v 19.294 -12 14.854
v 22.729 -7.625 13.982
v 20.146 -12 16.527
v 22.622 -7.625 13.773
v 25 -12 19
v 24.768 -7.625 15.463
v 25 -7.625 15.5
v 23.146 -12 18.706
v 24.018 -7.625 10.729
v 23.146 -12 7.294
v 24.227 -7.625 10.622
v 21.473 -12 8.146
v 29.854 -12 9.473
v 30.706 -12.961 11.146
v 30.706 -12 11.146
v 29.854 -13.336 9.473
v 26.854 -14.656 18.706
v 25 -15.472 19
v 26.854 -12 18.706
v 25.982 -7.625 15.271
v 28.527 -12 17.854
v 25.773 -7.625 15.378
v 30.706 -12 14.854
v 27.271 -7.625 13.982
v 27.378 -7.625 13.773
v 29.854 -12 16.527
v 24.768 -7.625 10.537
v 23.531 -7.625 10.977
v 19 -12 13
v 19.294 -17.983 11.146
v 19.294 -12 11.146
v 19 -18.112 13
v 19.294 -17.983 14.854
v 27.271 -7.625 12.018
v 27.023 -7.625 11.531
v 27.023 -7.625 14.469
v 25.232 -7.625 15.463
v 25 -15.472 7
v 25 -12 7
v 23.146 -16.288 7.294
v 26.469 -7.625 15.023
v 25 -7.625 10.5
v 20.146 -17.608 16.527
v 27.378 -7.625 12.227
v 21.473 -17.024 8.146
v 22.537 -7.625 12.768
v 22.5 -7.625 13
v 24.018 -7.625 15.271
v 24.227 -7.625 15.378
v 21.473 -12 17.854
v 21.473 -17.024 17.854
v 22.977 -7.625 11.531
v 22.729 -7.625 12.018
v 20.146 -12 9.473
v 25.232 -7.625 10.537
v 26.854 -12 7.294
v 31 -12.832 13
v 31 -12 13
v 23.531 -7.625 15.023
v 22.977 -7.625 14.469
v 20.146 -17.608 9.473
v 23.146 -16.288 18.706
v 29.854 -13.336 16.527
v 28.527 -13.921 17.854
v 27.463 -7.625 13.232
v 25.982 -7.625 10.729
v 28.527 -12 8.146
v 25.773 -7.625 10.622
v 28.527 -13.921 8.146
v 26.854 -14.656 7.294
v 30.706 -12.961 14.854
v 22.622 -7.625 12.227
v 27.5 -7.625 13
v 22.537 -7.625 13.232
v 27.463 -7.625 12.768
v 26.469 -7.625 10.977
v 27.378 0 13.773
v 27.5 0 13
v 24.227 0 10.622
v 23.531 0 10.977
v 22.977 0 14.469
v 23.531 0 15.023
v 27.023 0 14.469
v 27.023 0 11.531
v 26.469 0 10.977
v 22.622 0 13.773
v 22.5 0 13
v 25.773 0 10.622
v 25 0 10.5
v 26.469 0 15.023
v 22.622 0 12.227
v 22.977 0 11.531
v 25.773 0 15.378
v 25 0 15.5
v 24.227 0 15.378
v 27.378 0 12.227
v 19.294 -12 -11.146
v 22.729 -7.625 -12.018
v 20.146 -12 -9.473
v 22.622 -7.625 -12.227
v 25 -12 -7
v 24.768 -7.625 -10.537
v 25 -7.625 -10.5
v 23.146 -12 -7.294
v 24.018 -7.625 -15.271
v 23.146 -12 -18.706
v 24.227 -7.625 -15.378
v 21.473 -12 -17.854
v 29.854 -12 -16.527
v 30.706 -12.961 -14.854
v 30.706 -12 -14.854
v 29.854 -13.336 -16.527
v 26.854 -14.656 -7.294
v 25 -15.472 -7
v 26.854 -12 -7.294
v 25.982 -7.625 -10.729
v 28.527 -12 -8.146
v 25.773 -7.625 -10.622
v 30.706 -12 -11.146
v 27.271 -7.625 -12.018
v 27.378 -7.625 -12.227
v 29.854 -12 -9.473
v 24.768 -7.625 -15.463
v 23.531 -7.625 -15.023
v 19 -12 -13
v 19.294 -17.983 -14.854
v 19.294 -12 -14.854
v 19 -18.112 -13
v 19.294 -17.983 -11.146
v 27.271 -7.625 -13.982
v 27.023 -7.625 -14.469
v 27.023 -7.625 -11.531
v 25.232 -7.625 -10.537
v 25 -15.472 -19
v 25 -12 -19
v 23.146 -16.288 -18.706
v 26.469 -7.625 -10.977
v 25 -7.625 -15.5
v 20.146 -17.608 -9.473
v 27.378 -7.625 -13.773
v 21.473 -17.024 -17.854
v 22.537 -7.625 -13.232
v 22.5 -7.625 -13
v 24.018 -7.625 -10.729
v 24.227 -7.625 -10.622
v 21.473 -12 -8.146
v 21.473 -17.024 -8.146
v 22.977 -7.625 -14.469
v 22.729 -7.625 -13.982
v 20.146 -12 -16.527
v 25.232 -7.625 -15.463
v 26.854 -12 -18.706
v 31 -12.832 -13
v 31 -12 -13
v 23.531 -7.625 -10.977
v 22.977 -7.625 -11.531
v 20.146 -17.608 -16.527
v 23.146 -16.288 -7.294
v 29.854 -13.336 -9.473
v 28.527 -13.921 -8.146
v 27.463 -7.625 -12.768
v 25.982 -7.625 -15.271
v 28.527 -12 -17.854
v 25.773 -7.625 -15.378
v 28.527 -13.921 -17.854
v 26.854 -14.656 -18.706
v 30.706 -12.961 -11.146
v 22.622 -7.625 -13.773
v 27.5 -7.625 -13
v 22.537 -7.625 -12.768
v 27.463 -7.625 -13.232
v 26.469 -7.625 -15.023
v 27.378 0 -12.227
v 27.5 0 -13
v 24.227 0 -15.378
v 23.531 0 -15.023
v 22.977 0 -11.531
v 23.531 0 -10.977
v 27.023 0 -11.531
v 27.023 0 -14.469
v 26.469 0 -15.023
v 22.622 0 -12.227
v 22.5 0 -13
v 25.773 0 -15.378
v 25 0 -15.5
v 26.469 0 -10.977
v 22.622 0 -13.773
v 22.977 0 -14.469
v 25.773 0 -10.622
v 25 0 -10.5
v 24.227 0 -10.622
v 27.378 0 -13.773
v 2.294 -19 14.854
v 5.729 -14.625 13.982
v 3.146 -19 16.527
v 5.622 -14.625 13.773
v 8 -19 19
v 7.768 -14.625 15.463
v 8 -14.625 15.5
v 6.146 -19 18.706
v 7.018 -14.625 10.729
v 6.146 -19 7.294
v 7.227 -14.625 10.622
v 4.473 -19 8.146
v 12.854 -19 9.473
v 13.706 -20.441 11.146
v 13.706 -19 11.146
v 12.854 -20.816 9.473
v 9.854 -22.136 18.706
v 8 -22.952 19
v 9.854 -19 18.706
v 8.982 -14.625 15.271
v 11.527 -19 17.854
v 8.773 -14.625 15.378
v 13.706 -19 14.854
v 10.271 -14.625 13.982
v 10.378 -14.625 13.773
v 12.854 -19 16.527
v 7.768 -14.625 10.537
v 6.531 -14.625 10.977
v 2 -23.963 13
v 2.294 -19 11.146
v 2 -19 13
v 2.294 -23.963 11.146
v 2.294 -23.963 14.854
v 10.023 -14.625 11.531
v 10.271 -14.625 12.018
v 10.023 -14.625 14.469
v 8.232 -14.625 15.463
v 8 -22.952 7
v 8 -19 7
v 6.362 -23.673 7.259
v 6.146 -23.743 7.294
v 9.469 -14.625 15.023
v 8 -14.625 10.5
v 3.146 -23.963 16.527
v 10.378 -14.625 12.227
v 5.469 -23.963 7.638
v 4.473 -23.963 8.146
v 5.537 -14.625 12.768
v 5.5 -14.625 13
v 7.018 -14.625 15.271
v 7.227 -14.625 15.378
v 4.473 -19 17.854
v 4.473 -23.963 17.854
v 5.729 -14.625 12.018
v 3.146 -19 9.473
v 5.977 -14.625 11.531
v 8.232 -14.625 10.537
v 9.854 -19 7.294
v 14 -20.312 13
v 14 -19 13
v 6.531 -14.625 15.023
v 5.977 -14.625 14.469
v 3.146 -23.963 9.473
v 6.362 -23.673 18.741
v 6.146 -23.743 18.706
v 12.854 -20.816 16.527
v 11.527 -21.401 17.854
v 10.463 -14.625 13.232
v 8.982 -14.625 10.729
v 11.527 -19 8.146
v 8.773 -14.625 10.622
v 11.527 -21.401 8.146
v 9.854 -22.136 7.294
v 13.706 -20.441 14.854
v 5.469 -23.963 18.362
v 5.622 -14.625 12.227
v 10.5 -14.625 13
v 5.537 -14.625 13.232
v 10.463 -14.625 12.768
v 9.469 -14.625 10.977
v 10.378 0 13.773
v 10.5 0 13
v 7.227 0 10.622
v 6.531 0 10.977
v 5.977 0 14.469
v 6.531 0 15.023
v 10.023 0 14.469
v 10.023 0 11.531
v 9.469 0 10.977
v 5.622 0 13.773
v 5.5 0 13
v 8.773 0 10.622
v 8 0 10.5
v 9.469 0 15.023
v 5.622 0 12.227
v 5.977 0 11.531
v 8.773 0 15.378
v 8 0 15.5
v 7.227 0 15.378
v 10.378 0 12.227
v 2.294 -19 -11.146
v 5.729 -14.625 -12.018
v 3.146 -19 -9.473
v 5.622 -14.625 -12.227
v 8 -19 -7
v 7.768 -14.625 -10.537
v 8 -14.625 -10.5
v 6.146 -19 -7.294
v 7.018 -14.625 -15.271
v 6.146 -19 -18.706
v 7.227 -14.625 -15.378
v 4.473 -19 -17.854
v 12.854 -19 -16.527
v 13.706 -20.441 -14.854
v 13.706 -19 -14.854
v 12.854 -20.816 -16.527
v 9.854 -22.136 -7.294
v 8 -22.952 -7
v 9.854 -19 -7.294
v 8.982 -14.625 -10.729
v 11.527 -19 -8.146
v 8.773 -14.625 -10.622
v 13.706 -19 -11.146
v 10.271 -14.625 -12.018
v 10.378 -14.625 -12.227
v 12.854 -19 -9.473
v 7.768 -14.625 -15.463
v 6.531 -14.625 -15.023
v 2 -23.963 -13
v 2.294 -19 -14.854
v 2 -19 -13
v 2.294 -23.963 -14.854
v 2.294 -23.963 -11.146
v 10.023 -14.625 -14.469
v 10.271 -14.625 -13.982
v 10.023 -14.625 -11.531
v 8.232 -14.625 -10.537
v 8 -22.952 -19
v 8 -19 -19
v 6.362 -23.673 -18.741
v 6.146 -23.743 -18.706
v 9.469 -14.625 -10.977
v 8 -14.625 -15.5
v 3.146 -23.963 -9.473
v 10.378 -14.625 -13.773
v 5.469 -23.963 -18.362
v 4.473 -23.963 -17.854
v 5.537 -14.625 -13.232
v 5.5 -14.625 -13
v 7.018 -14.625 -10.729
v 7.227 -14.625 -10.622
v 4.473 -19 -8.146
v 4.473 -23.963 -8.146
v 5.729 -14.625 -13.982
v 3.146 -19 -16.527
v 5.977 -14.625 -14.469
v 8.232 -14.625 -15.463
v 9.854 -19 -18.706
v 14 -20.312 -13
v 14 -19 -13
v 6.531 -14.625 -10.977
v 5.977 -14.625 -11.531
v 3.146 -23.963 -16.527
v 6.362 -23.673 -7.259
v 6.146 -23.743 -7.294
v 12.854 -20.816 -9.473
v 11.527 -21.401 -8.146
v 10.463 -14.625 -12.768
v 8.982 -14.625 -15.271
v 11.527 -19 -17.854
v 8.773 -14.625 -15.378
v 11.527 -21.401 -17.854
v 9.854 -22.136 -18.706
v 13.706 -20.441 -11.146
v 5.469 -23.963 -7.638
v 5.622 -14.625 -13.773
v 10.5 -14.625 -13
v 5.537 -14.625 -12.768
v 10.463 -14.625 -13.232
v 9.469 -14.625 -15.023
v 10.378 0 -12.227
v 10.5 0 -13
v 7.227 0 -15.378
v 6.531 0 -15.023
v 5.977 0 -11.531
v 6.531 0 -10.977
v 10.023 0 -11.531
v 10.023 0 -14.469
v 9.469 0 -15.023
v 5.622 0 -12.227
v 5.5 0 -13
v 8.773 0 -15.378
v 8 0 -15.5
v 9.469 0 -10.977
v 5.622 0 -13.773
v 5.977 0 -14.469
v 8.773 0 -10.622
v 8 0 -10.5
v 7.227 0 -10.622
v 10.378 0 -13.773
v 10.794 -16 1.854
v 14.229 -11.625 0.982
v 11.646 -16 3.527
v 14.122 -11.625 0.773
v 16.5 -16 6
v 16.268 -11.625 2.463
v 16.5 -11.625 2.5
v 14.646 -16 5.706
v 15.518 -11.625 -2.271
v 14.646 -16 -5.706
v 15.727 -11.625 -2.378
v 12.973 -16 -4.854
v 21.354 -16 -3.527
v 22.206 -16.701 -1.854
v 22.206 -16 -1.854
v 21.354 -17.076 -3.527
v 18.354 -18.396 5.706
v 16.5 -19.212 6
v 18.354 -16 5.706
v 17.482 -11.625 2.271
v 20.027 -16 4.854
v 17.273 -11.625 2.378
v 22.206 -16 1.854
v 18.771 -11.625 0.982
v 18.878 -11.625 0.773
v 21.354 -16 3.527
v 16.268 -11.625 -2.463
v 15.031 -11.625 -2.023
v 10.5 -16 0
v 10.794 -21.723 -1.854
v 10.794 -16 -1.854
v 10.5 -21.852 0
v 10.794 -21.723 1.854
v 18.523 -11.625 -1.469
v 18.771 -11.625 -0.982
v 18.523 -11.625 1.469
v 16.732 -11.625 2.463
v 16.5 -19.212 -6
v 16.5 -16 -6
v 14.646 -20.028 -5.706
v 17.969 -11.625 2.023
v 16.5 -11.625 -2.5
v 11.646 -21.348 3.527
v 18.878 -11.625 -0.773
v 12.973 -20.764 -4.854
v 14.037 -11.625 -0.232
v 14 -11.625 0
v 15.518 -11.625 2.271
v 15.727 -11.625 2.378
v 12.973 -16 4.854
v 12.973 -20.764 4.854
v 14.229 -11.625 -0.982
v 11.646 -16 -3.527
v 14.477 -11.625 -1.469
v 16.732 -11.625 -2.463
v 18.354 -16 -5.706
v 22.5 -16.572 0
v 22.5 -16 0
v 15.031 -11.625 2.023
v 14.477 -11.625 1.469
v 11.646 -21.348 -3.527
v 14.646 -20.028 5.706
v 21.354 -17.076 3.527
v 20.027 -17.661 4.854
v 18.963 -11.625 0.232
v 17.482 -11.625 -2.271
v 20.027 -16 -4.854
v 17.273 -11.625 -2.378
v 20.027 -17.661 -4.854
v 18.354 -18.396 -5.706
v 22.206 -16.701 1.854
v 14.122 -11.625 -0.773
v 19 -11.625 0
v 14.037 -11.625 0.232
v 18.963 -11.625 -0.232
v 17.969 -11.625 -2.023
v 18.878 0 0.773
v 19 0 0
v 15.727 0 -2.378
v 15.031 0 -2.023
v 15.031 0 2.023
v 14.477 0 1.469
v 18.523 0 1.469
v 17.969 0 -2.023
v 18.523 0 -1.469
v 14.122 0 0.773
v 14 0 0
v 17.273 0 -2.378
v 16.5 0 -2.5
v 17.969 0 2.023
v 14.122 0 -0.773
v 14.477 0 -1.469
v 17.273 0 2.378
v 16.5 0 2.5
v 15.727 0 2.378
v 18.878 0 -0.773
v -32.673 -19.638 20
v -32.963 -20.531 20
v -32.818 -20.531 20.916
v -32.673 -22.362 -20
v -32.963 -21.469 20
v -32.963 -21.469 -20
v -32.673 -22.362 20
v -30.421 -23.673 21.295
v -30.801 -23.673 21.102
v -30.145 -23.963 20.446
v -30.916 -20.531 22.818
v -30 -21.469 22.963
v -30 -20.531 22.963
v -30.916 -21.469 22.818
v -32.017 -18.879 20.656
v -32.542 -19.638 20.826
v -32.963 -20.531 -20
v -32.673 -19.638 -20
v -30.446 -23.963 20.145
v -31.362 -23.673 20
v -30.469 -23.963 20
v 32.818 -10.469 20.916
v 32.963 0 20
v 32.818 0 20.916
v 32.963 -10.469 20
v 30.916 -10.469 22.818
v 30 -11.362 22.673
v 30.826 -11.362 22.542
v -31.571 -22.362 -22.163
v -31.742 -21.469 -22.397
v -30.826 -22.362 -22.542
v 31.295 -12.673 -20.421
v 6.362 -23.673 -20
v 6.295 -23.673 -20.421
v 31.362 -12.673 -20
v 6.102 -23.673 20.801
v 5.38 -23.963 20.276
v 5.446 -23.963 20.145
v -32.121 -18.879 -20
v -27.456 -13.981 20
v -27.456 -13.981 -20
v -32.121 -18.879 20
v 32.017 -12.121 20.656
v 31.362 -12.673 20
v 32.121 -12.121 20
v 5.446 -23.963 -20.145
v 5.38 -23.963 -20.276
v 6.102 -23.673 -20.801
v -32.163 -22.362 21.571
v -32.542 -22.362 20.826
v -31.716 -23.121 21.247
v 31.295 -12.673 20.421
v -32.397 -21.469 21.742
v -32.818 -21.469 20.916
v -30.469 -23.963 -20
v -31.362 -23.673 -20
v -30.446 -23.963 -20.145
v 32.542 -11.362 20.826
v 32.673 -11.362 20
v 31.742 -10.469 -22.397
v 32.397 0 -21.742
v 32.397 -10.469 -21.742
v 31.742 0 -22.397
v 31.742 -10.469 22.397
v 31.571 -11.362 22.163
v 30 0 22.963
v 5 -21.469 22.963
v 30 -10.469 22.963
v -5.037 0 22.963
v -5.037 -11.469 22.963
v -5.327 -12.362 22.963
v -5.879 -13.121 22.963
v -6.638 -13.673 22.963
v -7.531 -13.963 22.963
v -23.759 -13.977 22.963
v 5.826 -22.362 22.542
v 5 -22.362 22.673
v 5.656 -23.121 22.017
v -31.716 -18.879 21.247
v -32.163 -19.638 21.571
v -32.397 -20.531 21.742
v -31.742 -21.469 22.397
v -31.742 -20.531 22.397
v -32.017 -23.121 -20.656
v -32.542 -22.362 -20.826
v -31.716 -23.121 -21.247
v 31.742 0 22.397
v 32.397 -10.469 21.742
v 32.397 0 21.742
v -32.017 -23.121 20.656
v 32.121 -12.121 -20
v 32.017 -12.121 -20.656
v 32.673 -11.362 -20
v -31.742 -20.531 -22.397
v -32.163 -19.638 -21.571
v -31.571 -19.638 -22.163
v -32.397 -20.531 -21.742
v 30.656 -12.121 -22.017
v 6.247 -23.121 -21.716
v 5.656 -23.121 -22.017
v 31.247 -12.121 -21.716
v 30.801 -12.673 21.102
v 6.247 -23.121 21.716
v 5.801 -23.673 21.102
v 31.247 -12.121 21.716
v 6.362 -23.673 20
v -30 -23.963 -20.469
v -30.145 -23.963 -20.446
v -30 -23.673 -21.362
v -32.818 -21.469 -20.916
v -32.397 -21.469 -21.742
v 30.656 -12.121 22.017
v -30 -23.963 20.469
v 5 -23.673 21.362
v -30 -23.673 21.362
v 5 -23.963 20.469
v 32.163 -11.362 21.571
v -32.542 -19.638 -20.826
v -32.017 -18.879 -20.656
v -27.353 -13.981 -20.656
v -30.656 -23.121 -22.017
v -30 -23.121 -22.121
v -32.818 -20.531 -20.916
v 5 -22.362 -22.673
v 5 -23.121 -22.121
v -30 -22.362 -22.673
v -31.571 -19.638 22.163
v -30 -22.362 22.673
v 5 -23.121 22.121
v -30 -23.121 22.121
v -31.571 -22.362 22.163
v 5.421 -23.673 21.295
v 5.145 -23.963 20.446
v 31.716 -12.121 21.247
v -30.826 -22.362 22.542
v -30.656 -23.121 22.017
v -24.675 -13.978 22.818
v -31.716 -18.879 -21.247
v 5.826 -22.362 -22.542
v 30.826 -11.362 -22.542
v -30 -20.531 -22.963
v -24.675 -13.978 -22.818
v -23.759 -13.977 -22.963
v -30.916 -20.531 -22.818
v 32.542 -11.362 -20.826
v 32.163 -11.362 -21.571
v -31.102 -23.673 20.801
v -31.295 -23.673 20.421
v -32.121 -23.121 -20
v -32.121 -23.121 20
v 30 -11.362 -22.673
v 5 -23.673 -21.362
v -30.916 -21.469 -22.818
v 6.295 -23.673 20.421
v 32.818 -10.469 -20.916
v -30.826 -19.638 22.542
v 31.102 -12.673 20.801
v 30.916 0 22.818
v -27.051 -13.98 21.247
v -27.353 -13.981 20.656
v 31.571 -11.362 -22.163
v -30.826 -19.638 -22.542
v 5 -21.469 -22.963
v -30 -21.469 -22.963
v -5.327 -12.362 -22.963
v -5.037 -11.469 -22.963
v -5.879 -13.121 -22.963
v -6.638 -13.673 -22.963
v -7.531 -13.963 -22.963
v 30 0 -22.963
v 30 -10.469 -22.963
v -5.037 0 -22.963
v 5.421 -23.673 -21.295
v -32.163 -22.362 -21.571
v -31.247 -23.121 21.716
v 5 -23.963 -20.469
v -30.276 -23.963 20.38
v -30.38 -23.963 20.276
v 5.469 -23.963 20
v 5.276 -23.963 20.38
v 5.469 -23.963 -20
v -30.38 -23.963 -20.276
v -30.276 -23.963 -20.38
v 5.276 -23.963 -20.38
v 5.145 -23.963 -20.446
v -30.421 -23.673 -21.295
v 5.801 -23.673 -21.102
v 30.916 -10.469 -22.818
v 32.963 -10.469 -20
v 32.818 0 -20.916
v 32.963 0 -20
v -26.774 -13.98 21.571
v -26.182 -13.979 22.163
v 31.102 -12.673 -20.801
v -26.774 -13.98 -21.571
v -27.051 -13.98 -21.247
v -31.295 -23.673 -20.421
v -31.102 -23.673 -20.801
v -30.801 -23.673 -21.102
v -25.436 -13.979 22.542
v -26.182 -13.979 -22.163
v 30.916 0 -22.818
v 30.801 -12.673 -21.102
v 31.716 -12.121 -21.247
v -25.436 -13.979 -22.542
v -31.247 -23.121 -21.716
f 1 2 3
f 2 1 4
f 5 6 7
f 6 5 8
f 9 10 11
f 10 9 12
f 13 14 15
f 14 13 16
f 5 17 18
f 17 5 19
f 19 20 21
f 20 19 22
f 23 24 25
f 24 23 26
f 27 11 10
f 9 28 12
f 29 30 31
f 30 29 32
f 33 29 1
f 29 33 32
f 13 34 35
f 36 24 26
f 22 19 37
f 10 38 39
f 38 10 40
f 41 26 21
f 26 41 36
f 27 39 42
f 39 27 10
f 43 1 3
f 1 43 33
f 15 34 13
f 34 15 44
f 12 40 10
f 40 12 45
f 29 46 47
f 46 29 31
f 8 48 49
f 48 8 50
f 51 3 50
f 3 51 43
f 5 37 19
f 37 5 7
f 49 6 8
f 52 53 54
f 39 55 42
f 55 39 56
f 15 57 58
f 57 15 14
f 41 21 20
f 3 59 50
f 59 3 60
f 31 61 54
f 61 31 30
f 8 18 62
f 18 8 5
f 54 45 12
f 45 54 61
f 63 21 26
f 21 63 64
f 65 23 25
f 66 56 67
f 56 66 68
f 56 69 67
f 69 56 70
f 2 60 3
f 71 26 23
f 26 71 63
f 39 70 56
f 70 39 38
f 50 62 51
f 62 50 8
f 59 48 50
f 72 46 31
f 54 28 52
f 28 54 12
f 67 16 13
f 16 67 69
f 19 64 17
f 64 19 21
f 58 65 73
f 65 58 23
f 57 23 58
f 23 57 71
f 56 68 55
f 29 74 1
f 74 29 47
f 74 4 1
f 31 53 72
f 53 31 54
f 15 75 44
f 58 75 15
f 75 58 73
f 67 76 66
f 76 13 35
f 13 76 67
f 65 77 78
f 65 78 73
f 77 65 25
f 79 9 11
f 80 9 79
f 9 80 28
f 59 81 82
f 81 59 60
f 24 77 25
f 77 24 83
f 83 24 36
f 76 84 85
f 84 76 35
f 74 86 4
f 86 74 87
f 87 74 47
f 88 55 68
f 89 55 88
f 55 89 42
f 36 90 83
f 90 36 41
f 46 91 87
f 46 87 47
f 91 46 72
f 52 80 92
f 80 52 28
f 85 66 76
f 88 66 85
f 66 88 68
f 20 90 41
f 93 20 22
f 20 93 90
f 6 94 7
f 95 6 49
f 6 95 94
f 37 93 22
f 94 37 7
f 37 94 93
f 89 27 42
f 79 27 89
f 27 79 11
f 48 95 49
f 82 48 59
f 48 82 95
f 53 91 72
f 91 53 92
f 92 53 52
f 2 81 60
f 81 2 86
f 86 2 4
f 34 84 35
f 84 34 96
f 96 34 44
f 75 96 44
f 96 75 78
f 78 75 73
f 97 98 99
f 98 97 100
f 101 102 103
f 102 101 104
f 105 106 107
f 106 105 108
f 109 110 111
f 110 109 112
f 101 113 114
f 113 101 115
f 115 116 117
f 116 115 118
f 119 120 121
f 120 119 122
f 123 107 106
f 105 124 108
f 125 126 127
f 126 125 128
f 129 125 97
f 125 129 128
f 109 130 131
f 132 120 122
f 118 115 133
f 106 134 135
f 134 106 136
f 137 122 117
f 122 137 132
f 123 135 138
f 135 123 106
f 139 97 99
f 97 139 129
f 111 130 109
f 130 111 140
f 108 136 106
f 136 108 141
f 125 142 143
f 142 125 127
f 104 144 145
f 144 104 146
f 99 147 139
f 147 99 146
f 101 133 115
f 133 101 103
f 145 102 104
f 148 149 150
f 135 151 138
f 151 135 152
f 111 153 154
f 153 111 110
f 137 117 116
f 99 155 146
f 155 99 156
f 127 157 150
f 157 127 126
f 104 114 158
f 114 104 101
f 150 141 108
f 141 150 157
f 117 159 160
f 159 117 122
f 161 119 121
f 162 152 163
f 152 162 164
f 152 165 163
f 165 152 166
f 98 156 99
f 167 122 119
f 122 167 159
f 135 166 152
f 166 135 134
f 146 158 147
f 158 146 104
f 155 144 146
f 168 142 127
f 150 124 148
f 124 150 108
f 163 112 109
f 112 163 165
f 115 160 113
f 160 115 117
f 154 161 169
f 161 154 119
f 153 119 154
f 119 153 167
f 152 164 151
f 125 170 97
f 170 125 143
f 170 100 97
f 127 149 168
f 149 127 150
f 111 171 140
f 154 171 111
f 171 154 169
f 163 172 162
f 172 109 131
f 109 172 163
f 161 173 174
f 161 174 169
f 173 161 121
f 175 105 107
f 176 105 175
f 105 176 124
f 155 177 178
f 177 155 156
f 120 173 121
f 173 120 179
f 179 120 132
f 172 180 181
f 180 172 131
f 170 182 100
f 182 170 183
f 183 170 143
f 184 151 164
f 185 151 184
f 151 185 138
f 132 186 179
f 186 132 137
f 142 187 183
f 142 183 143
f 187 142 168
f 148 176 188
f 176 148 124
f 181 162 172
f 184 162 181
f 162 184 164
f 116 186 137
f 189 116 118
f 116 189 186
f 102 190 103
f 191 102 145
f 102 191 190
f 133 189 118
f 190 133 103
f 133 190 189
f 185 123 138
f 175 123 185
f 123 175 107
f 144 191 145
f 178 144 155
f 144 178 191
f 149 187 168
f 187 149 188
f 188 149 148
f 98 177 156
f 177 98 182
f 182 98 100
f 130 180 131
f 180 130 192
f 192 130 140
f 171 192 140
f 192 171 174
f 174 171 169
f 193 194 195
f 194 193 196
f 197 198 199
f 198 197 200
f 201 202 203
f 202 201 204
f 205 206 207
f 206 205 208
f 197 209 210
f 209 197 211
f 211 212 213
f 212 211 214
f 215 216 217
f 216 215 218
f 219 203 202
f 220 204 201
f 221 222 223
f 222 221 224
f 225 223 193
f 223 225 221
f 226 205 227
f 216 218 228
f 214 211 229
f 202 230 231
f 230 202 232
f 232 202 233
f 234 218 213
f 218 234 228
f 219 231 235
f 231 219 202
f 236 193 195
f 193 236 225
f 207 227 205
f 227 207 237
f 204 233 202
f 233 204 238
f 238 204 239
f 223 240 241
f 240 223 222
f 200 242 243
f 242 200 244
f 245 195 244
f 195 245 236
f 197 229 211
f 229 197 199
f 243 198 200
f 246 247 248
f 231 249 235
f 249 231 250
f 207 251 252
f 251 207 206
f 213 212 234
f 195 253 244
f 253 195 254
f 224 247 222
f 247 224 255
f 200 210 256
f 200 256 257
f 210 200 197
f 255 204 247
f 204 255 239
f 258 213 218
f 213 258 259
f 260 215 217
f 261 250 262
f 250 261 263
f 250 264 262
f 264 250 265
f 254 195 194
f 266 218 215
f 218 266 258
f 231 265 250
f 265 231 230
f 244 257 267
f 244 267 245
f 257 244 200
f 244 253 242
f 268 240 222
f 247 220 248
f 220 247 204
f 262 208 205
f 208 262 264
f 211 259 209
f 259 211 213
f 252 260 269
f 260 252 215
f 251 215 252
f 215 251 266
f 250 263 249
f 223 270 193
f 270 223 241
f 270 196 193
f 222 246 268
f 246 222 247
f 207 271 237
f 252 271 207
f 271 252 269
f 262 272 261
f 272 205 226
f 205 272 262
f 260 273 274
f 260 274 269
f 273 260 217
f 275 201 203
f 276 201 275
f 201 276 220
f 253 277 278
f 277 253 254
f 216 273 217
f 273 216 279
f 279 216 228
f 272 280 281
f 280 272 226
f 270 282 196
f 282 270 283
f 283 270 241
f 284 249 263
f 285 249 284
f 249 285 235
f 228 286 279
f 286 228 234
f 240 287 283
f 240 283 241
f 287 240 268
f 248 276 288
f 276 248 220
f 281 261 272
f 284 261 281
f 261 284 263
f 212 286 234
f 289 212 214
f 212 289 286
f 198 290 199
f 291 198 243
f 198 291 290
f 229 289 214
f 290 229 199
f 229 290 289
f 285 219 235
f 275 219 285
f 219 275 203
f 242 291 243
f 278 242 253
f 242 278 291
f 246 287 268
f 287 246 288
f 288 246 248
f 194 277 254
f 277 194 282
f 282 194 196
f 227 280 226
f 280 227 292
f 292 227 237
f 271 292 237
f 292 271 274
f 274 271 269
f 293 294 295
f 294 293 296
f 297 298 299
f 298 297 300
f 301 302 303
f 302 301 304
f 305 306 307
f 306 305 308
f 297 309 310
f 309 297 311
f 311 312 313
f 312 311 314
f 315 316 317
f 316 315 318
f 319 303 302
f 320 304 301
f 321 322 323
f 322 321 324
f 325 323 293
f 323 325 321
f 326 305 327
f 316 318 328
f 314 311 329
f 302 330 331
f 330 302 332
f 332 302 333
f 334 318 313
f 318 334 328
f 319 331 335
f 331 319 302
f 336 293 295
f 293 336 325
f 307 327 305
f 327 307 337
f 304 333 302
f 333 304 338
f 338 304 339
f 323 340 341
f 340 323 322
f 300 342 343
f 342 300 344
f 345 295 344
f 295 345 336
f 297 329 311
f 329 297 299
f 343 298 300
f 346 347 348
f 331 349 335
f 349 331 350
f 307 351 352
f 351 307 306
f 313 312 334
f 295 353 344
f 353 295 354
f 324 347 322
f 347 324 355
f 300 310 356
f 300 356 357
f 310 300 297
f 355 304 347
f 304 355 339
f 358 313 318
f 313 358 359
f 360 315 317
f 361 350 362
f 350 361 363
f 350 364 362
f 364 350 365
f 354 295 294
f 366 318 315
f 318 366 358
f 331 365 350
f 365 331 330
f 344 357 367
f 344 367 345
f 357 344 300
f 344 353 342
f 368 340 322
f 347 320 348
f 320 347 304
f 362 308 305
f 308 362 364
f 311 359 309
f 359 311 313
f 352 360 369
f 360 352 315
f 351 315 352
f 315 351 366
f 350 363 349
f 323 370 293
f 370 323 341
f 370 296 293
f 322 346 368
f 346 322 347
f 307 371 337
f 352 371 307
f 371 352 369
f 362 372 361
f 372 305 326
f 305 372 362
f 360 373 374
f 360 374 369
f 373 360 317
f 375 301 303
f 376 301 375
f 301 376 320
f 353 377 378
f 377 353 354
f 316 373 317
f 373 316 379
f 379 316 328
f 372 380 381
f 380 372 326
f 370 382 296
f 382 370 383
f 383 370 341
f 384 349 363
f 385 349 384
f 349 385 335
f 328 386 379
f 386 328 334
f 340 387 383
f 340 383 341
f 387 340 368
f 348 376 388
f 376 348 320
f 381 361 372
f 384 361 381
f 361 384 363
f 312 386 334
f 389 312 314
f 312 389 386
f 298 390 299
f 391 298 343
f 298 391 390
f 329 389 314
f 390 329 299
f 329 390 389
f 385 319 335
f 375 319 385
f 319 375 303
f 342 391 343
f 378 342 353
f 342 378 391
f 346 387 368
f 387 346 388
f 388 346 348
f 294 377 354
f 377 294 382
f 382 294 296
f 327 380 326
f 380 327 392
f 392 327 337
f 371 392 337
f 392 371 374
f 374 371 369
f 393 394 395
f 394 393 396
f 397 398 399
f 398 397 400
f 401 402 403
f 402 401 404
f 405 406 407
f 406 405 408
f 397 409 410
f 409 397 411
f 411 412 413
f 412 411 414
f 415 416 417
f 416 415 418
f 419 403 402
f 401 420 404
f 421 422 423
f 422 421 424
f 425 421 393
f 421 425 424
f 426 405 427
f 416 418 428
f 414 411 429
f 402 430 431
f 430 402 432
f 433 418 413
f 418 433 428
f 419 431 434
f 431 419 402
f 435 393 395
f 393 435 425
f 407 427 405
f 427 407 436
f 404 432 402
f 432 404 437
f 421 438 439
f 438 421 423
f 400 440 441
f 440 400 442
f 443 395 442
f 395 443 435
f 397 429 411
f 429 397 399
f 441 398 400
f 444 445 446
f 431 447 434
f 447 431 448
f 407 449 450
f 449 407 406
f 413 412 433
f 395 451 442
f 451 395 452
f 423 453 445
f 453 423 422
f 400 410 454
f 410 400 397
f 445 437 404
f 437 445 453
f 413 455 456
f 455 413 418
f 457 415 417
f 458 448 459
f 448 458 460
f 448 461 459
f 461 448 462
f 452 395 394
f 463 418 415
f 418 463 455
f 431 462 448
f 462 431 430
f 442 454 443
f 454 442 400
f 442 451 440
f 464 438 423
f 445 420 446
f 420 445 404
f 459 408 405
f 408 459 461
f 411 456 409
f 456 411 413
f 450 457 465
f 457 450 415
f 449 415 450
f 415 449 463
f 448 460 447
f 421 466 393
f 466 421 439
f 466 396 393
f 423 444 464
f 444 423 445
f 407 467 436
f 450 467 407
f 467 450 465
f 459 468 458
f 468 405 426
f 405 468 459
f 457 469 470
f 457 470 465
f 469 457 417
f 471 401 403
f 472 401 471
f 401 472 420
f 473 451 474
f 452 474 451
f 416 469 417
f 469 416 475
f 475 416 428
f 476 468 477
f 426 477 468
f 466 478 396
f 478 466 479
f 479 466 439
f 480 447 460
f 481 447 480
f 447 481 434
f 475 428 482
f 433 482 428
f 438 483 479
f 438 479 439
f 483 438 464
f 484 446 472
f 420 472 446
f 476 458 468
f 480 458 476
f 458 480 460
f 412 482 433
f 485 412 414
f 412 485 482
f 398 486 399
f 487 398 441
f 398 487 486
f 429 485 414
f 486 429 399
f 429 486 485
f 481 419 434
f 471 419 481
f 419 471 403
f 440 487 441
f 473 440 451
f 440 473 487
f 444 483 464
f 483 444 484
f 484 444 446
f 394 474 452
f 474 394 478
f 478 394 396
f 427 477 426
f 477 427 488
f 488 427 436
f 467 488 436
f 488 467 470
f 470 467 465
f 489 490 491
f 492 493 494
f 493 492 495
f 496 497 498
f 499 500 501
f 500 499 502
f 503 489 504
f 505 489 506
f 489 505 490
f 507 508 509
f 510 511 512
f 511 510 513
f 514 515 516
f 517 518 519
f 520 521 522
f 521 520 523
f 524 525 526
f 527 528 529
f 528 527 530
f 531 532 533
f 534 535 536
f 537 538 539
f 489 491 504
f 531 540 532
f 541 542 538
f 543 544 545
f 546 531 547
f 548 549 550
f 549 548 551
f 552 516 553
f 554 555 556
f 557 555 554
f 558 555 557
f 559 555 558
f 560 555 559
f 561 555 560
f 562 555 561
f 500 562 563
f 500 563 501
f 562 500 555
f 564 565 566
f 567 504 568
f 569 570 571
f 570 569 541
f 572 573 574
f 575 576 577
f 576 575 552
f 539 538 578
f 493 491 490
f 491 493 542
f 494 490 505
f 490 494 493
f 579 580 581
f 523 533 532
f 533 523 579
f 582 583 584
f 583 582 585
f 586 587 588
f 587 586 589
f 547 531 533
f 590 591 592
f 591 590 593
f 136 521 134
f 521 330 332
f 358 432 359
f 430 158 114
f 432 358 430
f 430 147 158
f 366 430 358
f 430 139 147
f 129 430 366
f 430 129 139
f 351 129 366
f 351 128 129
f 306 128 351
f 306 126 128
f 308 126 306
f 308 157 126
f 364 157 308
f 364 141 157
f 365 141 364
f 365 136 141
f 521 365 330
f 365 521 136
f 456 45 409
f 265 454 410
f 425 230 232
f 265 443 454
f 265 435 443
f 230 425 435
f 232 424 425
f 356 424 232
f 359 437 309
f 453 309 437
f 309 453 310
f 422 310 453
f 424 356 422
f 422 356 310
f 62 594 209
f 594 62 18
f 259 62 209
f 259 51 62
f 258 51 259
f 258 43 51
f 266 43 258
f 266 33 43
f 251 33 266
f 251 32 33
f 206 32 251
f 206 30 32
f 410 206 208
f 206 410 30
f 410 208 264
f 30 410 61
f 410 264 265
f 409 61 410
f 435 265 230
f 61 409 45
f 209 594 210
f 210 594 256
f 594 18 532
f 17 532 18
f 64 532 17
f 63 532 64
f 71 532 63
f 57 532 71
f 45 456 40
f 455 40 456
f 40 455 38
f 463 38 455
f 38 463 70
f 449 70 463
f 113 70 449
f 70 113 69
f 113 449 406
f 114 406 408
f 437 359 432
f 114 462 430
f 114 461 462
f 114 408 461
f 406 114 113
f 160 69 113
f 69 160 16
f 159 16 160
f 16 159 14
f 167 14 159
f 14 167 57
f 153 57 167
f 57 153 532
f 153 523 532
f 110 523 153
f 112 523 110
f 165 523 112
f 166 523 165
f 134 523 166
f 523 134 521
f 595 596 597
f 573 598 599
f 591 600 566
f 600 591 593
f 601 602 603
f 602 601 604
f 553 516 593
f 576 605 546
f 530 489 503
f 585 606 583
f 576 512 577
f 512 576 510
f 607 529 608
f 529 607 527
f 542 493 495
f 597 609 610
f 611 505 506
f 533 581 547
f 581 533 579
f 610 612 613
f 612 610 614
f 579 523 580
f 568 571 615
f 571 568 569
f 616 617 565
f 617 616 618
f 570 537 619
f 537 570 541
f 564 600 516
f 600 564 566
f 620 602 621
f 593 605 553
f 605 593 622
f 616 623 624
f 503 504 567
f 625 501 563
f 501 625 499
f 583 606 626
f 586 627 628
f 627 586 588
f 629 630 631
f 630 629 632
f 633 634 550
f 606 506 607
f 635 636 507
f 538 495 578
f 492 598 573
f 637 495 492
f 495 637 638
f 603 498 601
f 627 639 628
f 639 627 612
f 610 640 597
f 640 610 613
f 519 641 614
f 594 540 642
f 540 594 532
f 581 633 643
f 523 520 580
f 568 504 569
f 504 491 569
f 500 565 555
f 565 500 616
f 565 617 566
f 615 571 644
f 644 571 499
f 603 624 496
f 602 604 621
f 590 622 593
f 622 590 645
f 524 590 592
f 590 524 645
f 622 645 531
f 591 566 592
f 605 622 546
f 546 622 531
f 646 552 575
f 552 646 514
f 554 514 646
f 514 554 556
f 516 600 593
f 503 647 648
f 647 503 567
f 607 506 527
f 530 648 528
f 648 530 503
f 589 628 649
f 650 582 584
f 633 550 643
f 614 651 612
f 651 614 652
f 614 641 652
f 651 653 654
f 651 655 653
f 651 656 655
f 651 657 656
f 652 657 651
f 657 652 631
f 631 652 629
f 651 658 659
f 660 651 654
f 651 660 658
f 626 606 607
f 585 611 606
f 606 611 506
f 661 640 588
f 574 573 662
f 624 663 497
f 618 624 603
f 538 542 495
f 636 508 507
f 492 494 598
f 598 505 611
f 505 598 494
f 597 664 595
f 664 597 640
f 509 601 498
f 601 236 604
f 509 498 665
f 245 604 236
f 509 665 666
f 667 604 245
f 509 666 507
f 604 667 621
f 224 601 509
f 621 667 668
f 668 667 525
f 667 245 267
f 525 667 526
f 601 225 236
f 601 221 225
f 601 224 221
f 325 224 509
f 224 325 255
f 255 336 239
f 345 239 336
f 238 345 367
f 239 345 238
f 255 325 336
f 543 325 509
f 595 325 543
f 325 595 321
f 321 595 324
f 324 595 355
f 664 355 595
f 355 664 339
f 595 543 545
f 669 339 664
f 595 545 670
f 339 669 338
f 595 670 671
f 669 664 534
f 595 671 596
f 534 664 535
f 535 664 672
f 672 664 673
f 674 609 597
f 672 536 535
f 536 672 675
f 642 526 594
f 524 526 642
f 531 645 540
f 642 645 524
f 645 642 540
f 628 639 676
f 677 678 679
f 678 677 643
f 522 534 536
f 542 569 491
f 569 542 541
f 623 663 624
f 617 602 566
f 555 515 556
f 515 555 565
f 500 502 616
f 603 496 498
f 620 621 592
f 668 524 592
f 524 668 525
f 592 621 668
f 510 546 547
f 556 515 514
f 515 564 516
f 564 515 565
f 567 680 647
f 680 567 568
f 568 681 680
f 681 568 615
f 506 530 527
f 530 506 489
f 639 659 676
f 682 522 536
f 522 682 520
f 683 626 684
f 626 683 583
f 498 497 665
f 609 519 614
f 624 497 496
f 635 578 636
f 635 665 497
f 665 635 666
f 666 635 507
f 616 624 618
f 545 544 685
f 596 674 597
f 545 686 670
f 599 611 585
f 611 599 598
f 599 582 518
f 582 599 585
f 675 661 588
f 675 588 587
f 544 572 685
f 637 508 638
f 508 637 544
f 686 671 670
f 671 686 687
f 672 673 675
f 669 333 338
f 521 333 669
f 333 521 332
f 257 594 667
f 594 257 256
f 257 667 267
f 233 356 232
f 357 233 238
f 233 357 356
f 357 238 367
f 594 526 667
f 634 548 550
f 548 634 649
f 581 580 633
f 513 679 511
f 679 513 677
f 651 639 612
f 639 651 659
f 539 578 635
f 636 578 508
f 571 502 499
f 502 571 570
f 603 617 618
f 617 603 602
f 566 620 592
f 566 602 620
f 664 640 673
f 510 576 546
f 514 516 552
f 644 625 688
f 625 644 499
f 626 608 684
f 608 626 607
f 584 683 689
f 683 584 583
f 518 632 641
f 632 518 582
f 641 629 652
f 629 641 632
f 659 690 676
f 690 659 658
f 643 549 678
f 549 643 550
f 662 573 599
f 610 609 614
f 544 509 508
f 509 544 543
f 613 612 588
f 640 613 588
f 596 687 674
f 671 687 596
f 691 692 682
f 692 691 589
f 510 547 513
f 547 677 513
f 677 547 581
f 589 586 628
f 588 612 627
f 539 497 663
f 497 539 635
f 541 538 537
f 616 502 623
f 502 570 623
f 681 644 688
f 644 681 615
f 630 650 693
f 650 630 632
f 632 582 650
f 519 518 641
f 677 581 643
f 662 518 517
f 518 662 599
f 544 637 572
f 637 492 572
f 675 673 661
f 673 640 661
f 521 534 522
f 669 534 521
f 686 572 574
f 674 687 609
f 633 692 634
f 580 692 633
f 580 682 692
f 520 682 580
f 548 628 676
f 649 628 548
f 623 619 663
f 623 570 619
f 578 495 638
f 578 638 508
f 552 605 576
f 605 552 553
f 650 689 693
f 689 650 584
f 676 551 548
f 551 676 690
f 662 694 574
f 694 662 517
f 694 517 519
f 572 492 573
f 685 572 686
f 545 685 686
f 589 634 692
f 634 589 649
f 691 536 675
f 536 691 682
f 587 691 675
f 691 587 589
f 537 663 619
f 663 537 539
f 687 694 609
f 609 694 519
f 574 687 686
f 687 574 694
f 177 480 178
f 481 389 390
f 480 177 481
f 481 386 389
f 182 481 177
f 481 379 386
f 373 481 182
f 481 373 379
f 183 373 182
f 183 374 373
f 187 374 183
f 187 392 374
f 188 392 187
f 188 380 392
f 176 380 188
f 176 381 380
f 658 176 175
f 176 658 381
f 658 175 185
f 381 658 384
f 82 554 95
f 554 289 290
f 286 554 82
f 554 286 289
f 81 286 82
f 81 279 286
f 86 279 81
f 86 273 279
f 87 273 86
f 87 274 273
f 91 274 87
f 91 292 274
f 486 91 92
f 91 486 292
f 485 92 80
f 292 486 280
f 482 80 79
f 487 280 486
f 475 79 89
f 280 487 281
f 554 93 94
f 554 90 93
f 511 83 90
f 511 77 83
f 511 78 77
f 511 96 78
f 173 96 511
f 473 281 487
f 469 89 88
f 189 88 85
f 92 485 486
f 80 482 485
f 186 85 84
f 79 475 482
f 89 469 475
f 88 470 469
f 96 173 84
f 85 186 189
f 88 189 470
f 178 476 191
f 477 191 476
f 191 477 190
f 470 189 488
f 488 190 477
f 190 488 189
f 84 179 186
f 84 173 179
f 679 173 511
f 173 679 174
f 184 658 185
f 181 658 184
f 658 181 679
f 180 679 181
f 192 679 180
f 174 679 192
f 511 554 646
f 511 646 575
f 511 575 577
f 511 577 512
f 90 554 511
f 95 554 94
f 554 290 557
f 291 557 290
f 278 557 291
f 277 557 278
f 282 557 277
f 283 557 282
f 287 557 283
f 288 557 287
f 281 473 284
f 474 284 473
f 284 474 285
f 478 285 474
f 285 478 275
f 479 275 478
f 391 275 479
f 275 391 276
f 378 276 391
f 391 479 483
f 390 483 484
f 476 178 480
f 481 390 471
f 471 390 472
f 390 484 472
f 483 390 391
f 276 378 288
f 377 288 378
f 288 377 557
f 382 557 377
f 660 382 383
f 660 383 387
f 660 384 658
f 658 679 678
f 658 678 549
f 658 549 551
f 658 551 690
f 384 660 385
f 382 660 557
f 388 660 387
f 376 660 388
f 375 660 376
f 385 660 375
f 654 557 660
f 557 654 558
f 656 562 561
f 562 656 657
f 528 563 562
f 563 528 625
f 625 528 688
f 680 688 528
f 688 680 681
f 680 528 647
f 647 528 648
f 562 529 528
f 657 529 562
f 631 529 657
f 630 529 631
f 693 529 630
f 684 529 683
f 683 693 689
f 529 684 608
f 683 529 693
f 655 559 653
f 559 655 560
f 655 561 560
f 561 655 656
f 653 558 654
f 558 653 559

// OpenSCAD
$fn=20;
module panneau(){
    translate([0,-170,3.5])rotate([0,-90,0]) difference(){
        translate([-10,0,-55.5])cube([10,340,400]);
        translate([-3.5,55.5,0])cube([10,229,300]);
    }
}
module vis(){
    hull(){
        translate([0,0,30])  cylinder(r1=6,r2=6,h=1);
        translate([0,0,-4])  cylinder(r1=2,r2=6,h=5);
    }
    translate([0,0,-104])  cylinder(r=2.5,h=101);
}


module support(overlap = true){
    difference(){
    hull(){
        translate([5,20,21]) sphere(r=3);
        translate([5,-20,21]) sphere(r=3);
        translate([-10,20,0]) sphere(r=3);
        translate([-10,-20,0]) sphere(r=3);
        translate([30,20,10]) sphere(r=3);
        translate([30,-20,10]) sphere(r=3);
        translate([30,20,0]) sphere(r=3);
        translate([30,-20,0]) sphere(r=3);
        translate([-30,20,21]) sphere(r=3);
        translate([-30,-20,21]) sphere(r=3);
    }
    if(overlap){
        panneau();
    } else {
        translate([-150,-150,-10]) cube([300,300,10]);
        }
    hull(){
        translate([-8,30,11]) sphere(r=3);
        translate([-8,-30,11]) sphere(r=3);
        translate([-8,30,-5]) sphere(r=3);
        translate([-8,-30,-5]) sphere(r=3);

        translate([-50,0,0]) cube([1,66,28],center=true);
    }
    translate([25,13,11]) vis();
    translate([25,-13,11]) vis();
    translate([8,13,18]) vis();
    translate([8,-13,18]) vis();
    translate([16.5,0,15]) vis();
}
    }

rotate([90,0,0]) support(false);
//panneau();
    
